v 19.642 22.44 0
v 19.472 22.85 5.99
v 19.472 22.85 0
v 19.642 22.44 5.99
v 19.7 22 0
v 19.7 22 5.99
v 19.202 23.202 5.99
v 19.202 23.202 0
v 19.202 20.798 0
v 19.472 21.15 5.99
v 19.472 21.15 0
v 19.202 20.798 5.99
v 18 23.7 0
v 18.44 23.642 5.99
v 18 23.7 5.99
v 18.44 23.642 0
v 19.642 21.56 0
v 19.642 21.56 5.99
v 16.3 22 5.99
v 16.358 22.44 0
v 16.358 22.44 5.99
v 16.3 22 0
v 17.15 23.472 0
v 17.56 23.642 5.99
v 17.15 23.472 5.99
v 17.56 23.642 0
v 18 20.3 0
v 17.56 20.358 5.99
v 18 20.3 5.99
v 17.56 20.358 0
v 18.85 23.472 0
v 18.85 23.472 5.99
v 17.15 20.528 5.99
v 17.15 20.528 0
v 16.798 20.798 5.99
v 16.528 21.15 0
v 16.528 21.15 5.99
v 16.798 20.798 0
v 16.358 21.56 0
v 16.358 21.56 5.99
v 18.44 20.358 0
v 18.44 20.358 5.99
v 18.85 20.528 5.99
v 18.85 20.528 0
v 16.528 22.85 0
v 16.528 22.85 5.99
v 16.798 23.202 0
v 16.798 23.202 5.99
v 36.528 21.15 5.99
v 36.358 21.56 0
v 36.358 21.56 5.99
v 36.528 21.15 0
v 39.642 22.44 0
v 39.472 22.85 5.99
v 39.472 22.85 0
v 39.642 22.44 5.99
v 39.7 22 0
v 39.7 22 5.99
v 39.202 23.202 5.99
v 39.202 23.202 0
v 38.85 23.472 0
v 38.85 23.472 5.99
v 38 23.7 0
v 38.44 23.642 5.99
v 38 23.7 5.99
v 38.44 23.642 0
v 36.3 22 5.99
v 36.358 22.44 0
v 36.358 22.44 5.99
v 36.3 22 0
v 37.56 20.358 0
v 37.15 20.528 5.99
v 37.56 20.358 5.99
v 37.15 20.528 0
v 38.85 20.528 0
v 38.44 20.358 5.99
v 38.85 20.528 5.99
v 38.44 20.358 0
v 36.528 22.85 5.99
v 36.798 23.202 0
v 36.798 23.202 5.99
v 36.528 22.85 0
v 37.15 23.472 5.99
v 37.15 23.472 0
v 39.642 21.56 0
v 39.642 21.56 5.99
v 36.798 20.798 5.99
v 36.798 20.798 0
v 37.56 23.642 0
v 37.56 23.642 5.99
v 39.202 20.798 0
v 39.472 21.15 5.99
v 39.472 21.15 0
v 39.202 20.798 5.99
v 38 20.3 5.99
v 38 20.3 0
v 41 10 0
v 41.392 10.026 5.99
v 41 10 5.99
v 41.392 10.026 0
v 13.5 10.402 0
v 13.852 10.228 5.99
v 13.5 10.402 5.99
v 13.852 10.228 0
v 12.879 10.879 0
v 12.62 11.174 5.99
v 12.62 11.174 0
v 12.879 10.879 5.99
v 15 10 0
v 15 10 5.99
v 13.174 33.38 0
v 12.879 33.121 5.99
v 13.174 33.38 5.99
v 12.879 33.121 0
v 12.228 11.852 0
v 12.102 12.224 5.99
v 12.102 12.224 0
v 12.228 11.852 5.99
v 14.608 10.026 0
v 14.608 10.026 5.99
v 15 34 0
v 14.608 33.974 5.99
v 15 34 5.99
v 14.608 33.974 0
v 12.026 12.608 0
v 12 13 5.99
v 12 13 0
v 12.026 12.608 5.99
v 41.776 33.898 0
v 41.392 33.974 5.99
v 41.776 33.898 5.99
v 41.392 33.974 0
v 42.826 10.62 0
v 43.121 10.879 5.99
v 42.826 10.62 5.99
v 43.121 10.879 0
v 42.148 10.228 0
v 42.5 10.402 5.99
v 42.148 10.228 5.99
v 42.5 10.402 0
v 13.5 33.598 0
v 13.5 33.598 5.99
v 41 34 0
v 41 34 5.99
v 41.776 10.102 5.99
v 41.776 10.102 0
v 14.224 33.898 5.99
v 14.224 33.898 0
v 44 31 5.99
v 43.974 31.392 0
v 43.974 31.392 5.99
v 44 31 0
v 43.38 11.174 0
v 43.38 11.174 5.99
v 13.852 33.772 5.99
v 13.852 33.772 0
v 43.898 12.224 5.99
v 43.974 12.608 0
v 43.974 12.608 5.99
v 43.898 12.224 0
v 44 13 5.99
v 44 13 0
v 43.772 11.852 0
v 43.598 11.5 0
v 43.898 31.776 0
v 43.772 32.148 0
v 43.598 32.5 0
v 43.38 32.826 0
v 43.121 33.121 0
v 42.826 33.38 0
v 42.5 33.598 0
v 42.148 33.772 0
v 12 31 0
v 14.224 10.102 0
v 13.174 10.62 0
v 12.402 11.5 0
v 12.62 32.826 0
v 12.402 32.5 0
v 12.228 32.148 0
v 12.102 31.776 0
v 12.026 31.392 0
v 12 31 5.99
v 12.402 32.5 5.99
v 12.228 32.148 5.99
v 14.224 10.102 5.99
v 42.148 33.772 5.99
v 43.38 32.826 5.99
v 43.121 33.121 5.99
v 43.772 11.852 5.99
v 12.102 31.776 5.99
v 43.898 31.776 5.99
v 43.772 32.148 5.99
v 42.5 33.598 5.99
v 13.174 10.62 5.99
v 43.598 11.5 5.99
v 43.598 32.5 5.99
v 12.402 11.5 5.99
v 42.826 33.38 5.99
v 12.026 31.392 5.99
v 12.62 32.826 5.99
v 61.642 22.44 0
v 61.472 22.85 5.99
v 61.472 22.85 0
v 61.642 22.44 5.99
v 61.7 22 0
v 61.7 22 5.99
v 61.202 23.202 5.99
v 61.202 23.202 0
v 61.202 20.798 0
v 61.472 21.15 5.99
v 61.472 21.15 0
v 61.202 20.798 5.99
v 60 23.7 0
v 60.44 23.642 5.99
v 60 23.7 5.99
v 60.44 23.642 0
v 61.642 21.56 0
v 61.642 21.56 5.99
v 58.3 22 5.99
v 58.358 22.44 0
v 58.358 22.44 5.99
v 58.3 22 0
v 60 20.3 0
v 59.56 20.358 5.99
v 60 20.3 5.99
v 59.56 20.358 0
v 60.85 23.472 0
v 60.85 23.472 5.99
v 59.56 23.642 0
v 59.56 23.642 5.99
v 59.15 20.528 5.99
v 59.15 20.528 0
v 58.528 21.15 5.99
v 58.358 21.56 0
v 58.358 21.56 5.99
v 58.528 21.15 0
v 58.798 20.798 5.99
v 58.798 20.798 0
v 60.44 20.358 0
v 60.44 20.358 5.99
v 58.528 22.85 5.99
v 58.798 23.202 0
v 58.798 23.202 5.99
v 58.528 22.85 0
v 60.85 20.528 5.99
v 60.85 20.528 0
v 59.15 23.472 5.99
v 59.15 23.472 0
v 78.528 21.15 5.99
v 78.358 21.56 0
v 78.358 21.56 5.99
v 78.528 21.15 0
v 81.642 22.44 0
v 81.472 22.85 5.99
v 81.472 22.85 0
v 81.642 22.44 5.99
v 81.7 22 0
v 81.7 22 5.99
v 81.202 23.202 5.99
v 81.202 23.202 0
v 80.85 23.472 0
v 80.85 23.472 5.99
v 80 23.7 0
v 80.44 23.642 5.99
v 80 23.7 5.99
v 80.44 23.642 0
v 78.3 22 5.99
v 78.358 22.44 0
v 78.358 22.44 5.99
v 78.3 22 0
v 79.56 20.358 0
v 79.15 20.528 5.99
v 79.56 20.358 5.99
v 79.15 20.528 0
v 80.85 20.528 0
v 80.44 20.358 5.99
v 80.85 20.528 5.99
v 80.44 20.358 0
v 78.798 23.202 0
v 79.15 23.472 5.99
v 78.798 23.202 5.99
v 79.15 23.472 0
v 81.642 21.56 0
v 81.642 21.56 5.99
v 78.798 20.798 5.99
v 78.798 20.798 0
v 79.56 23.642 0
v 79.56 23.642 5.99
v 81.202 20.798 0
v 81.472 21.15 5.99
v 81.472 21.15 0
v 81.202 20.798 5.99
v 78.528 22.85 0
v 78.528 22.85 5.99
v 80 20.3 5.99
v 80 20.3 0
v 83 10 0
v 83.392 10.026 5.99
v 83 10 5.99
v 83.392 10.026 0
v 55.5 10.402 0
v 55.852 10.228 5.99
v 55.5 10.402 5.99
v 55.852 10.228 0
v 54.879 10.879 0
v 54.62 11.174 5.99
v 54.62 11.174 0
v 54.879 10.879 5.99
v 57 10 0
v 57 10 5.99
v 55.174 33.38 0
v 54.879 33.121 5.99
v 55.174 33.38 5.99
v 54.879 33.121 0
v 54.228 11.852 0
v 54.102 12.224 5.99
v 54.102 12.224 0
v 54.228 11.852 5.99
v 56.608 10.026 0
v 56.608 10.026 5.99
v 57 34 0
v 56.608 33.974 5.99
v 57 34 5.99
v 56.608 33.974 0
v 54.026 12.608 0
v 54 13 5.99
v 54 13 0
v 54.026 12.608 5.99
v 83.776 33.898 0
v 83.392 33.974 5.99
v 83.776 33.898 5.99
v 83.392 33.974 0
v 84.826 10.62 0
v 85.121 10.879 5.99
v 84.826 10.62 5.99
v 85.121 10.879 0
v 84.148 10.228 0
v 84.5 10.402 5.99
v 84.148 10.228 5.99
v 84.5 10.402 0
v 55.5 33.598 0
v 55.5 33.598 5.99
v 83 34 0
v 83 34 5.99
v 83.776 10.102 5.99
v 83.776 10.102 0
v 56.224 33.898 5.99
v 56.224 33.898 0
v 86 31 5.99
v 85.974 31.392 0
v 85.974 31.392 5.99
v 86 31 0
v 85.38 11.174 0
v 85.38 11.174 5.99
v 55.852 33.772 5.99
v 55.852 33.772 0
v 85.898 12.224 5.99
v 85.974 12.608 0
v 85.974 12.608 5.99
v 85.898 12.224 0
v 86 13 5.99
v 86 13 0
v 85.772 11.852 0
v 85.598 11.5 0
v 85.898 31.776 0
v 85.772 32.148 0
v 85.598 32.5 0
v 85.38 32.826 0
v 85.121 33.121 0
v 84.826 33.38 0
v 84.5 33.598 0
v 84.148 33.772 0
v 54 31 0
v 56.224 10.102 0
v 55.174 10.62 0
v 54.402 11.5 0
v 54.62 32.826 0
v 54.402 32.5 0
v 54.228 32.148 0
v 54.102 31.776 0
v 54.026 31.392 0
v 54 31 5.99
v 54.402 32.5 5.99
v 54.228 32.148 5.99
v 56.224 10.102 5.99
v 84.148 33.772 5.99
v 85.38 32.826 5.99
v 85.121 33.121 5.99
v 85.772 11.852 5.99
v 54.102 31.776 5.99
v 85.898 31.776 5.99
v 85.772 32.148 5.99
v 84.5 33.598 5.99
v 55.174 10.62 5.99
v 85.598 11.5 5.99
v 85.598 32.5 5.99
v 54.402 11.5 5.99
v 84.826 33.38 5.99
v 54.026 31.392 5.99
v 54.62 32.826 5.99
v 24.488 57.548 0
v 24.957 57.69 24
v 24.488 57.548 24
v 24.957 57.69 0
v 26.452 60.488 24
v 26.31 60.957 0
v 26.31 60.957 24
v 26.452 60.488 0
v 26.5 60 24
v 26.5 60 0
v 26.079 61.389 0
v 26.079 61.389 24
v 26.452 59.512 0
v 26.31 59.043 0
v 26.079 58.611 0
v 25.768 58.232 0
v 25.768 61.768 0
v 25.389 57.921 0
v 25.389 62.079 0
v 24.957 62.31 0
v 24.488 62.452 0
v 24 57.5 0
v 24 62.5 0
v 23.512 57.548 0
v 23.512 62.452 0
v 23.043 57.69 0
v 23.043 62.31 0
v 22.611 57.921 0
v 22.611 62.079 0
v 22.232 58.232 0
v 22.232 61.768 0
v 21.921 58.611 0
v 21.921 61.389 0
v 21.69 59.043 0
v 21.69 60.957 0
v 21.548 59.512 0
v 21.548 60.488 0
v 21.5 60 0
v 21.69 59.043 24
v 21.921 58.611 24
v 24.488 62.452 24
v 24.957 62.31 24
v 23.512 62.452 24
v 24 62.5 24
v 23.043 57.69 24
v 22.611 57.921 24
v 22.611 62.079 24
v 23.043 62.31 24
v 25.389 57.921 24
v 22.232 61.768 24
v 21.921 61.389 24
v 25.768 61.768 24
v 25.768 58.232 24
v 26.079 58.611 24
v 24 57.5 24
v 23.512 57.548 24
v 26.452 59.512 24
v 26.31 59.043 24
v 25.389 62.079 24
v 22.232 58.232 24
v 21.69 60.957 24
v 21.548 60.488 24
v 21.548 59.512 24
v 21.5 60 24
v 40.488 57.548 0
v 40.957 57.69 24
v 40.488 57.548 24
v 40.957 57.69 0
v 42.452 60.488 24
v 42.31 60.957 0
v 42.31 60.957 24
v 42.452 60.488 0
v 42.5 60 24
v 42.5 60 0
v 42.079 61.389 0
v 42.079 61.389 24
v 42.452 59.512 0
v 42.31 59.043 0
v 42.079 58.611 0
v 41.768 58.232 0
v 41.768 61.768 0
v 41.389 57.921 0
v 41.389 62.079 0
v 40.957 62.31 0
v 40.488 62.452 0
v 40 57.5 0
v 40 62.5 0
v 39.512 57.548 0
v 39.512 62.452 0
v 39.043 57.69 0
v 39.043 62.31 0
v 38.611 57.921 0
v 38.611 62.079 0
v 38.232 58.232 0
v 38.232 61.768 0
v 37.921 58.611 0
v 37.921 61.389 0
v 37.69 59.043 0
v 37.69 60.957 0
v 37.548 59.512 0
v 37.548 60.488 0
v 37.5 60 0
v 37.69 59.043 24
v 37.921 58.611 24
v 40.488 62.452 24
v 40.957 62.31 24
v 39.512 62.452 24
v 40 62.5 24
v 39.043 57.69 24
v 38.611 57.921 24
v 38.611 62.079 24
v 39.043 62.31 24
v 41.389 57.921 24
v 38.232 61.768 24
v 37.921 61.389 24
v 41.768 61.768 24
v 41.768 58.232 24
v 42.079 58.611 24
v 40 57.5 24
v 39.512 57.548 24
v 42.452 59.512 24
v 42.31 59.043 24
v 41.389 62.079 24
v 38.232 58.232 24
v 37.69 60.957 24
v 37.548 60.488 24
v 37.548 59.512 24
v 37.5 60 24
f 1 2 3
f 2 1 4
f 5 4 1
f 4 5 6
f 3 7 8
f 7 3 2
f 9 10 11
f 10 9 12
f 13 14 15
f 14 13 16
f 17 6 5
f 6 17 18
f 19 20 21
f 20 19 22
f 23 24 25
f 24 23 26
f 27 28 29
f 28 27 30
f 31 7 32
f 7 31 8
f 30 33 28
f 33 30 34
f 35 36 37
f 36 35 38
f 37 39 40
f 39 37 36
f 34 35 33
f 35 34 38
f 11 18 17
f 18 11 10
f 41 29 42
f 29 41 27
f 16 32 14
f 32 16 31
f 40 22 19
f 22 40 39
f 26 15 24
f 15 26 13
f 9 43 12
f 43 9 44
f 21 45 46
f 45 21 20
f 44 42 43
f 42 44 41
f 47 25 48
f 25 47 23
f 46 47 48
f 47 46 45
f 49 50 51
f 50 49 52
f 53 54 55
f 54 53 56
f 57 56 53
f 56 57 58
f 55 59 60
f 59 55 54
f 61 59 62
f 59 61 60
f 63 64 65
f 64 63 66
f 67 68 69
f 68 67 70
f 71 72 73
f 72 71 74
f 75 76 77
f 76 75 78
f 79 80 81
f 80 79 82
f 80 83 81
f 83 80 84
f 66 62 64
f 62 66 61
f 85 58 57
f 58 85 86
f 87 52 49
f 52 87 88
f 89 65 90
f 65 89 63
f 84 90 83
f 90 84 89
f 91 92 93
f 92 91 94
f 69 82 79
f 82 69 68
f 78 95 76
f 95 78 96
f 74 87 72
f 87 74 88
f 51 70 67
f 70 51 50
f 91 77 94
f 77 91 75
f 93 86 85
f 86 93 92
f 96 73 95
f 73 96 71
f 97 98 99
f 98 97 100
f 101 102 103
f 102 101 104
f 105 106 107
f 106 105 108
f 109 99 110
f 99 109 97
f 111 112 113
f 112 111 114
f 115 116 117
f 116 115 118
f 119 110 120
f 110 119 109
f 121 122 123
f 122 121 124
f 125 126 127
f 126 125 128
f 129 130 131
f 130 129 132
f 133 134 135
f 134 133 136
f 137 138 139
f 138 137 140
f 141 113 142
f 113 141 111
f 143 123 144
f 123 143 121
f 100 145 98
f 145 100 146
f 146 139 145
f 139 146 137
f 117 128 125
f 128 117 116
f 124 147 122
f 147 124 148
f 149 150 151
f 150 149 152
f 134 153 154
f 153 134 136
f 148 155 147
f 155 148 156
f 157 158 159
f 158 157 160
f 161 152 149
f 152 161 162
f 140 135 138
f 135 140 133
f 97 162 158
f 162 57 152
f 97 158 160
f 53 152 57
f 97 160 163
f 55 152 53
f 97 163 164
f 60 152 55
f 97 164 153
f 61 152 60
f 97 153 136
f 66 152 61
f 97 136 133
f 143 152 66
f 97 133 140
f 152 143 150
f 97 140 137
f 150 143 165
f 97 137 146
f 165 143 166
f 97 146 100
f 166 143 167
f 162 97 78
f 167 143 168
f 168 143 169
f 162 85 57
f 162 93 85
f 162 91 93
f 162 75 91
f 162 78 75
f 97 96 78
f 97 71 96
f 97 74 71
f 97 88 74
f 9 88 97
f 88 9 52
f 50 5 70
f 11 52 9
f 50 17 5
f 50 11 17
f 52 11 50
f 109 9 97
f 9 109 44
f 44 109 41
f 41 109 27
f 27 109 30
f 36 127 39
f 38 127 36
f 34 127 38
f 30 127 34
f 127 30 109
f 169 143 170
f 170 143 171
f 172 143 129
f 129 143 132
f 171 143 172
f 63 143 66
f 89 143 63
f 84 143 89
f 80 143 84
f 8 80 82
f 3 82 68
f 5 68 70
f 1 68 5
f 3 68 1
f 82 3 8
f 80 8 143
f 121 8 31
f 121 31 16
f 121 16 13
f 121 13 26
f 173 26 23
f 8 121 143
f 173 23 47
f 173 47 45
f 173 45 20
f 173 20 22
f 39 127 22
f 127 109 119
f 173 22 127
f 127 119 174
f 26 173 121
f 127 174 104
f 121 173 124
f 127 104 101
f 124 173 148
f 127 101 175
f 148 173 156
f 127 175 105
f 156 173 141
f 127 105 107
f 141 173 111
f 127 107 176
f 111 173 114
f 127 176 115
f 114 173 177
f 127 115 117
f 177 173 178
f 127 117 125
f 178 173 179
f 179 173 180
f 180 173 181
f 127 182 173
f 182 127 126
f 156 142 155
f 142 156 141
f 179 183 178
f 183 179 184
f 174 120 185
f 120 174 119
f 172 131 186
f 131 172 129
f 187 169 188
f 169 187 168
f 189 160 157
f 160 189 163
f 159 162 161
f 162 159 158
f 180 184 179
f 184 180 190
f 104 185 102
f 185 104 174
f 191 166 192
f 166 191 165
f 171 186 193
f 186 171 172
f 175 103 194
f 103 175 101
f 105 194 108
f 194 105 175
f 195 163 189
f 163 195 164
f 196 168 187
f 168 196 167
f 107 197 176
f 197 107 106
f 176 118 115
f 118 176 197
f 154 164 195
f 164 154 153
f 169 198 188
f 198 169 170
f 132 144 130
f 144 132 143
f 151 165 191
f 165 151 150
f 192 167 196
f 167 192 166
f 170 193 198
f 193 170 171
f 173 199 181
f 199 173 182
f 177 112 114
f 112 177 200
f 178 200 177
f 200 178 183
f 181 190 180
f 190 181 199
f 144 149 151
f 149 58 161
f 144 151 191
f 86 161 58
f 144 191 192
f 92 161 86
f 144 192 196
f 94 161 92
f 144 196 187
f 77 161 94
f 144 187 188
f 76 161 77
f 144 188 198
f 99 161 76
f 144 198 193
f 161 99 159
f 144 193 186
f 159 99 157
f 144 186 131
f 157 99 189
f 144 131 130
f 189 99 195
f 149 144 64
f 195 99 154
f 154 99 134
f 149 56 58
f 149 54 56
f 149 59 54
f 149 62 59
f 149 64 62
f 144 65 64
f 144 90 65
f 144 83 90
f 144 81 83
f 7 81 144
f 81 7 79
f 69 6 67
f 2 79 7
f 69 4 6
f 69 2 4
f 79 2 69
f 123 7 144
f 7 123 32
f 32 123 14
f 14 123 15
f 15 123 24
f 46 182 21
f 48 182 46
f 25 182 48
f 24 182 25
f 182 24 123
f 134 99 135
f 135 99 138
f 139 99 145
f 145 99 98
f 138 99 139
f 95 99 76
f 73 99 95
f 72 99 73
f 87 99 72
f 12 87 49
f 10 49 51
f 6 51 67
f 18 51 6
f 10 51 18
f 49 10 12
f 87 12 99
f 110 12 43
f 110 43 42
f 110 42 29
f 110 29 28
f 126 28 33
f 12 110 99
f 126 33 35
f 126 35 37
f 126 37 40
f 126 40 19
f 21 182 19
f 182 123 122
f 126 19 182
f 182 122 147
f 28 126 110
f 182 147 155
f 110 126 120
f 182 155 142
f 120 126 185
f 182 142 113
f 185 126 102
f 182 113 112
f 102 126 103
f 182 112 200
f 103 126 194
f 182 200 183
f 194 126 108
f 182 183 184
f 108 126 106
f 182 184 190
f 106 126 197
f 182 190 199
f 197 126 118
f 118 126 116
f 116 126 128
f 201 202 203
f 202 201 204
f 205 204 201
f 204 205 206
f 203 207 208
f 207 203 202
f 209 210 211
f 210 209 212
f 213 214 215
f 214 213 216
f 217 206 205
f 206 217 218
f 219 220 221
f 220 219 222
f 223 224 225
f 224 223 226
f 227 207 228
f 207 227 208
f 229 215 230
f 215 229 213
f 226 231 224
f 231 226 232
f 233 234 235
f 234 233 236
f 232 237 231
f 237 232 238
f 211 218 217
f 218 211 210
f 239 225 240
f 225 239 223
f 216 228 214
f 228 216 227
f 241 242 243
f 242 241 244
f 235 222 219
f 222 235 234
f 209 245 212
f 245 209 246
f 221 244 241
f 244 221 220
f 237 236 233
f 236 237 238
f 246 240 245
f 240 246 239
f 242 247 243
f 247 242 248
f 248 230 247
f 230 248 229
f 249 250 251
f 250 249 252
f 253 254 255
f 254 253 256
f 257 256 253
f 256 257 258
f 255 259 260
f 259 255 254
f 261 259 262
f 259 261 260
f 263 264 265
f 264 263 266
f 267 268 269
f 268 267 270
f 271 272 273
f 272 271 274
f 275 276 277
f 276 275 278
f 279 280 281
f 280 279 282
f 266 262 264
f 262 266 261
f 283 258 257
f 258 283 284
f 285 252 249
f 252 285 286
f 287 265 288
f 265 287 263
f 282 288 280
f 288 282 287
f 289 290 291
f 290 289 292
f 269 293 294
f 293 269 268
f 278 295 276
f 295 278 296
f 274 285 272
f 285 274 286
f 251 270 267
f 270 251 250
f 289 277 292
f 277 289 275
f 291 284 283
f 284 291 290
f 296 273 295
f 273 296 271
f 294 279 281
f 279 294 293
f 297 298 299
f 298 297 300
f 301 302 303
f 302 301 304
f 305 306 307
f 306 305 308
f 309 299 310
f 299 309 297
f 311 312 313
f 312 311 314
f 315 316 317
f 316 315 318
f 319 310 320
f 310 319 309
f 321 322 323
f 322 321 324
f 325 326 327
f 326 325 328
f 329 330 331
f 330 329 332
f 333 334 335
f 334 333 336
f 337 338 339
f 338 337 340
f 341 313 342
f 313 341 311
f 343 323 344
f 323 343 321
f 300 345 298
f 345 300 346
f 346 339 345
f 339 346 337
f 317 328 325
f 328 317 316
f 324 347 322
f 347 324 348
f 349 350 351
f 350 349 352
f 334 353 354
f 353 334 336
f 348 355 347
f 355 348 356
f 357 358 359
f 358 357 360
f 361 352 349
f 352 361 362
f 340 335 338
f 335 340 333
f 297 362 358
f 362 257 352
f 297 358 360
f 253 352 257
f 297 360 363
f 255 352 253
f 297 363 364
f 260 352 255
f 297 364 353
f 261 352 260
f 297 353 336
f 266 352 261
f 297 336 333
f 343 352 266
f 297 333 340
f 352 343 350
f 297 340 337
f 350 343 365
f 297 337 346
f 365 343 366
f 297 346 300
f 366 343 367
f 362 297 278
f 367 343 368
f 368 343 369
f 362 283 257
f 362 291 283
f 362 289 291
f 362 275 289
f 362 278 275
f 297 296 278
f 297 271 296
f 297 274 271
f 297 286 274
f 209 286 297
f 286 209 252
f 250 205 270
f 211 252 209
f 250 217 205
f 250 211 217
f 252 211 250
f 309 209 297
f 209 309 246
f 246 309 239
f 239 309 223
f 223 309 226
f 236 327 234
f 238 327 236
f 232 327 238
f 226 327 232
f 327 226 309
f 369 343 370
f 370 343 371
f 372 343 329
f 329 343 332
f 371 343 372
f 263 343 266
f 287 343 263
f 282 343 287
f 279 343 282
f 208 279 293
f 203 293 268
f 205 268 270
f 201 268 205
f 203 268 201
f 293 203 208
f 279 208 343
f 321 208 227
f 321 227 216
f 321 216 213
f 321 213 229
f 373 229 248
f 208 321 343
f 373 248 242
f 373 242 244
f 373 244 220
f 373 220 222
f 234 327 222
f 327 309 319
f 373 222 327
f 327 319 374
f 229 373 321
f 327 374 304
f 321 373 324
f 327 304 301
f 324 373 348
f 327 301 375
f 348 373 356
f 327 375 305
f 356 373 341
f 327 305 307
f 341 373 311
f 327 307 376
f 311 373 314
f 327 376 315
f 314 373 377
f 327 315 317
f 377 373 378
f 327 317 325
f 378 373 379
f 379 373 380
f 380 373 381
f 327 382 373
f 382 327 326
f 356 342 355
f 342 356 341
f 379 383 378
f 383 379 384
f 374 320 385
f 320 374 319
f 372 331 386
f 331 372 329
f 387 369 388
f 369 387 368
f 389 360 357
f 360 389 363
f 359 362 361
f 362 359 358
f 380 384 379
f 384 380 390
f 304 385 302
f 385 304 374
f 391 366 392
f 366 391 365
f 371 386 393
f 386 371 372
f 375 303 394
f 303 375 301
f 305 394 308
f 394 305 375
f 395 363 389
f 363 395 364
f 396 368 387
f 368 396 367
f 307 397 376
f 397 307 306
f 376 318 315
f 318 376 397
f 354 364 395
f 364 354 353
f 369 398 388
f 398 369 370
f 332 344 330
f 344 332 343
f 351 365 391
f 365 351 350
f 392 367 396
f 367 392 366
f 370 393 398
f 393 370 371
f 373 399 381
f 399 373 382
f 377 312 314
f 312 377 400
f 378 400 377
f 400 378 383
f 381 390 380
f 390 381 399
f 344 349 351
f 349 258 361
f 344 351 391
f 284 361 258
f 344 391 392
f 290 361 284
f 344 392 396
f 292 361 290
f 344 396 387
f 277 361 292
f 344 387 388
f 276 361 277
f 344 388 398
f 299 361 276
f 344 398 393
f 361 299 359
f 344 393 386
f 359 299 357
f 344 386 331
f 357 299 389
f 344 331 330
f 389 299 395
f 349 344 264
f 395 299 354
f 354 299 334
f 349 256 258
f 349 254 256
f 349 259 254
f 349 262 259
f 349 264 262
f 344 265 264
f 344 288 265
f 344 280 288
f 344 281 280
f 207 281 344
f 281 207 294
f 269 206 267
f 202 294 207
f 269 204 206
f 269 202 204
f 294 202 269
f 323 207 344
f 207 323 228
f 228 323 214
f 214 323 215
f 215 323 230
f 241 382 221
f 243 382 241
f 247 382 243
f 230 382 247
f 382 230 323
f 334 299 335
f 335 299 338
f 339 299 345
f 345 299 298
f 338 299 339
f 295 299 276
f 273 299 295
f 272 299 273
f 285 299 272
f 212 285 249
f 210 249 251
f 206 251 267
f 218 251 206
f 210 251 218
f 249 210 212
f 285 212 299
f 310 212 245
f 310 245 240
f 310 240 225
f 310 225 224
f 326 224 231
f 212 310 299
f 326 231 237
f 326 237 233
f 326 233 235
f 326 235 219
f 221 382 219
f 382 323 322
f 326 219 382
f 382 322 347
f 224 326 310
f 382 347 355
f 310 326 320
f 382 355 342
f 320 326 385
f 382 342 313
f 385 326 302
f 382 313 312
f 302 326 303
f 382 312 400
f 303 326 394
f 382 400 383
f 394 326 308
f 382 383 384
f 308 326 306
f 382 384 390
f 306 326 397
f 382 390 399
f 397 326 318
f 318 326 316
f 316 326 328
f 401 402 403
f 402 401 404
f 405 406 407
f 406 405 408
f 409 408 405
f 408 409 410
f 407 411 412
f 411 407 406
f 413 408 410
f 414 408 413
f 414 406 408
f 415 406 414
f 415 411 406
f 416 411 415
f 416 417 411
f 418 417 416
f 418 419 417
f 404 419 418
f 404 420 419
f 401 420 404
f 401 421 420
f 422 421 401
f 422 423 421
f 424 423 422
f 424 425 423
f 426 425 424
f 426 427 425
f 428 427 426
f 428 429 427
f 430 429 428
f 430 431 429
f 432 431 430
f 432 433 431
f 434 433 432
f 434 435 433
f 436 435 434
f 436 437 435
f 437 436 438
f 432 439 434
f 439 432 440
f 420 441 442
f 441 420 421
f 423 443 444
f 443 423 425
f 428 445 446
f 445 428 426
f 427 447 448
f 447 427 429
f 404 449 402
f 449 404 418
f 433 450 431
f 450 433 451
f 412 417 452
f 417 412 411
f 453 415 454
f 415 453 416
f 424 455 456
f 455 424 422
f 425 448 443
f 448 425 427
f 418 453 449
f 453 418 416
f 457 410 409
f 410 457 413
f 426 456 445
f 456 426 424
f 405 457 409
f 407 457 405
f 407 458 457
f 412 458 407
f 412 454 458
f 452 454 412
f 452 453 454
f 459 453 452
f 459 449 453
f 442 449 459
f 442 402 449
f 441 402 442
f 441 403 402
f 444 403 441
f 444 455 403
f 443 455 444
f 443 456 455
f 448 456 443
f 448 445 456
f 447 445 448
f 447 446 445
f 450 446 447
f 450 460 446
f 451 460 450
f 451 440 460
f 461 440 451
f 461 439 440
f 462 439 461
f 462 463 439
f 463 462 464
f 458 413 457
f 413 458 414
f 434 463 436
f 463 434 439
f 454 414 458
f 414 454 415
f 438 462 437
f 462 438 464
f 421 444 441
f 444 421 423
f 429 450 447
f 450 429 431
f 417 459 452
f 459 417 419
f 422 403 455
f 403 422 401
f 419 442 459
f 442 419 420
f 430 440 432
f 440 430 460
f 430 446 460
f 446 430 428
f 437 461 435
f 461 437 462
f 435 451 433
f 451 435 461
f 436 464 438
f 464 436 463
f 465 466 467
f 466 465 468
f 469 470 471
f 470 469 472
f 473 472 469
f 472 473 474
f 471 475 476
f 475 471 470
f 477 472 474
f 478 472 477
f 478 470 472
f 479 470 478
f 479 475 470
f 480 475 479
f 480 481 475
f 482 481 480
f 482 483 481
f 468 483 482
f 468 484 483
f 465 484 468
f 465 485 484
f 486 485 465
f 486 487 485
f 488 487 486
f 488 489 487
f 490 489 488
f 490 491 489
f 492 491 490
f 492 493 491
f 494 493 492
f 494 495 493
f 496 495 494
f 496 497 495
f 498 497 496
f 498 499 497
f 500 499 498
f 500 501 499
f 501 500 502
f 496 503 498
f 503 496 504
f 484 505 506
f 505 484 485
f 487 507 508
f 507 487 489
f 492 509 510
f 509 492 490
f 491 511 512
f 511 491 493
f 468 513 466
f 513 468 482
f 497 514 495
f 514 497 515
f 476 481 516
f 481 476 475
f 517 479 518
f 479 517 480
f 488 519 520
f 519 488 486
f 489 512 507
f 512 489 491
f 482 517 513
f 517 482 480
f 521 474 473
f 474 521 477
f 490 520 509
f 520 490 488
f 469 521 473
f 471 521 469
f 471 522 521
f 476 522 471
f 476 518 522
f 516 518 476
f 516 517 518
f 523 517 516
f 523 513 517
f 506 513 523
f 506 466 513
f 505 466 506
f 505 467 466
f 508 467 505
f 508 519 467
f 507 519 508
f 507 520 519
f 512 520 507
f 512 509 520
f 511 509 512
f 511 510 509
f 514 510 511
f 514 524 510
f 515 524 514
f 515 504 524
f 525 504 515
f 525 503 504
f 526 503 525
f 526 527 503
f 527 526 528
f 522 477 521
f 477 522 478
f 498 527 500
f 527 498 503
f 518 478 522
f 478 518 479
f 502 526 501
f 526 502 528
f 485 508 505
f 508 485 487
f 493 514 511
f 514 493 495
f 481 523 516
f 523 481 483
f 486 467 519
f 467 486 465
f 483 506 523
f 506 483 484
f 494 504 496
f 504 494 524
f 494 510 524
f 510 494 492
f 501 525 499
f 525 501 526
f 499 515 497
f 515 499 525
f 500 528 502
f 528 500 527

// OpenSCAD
/*
Sample 110: Geteilte Wellen-Klemmkupplung — 5-mm-Welle
Generated from the FDM Mechanical Sample Library.
Units: millimetres.

Override examples:
  openscad -o custom.stl -D 'view="plate"' -D 'render_fn=64' model.scad
  openscad -o preview.png -D 'view="assembly"' model.scad
*/
use <../../../library/fdm_mechanisms.scad>

render_fn = is_undef(render_fn) ? 48 : render_fn;
view = is_undef(view) ? "plate" : view;
$fn = render_fn;

sample_shaft_coupler(
    view=view,
    bore_d=5,
    clearance=0.18,
    screw_d=3.4,
    nut_flat=5.7
);
